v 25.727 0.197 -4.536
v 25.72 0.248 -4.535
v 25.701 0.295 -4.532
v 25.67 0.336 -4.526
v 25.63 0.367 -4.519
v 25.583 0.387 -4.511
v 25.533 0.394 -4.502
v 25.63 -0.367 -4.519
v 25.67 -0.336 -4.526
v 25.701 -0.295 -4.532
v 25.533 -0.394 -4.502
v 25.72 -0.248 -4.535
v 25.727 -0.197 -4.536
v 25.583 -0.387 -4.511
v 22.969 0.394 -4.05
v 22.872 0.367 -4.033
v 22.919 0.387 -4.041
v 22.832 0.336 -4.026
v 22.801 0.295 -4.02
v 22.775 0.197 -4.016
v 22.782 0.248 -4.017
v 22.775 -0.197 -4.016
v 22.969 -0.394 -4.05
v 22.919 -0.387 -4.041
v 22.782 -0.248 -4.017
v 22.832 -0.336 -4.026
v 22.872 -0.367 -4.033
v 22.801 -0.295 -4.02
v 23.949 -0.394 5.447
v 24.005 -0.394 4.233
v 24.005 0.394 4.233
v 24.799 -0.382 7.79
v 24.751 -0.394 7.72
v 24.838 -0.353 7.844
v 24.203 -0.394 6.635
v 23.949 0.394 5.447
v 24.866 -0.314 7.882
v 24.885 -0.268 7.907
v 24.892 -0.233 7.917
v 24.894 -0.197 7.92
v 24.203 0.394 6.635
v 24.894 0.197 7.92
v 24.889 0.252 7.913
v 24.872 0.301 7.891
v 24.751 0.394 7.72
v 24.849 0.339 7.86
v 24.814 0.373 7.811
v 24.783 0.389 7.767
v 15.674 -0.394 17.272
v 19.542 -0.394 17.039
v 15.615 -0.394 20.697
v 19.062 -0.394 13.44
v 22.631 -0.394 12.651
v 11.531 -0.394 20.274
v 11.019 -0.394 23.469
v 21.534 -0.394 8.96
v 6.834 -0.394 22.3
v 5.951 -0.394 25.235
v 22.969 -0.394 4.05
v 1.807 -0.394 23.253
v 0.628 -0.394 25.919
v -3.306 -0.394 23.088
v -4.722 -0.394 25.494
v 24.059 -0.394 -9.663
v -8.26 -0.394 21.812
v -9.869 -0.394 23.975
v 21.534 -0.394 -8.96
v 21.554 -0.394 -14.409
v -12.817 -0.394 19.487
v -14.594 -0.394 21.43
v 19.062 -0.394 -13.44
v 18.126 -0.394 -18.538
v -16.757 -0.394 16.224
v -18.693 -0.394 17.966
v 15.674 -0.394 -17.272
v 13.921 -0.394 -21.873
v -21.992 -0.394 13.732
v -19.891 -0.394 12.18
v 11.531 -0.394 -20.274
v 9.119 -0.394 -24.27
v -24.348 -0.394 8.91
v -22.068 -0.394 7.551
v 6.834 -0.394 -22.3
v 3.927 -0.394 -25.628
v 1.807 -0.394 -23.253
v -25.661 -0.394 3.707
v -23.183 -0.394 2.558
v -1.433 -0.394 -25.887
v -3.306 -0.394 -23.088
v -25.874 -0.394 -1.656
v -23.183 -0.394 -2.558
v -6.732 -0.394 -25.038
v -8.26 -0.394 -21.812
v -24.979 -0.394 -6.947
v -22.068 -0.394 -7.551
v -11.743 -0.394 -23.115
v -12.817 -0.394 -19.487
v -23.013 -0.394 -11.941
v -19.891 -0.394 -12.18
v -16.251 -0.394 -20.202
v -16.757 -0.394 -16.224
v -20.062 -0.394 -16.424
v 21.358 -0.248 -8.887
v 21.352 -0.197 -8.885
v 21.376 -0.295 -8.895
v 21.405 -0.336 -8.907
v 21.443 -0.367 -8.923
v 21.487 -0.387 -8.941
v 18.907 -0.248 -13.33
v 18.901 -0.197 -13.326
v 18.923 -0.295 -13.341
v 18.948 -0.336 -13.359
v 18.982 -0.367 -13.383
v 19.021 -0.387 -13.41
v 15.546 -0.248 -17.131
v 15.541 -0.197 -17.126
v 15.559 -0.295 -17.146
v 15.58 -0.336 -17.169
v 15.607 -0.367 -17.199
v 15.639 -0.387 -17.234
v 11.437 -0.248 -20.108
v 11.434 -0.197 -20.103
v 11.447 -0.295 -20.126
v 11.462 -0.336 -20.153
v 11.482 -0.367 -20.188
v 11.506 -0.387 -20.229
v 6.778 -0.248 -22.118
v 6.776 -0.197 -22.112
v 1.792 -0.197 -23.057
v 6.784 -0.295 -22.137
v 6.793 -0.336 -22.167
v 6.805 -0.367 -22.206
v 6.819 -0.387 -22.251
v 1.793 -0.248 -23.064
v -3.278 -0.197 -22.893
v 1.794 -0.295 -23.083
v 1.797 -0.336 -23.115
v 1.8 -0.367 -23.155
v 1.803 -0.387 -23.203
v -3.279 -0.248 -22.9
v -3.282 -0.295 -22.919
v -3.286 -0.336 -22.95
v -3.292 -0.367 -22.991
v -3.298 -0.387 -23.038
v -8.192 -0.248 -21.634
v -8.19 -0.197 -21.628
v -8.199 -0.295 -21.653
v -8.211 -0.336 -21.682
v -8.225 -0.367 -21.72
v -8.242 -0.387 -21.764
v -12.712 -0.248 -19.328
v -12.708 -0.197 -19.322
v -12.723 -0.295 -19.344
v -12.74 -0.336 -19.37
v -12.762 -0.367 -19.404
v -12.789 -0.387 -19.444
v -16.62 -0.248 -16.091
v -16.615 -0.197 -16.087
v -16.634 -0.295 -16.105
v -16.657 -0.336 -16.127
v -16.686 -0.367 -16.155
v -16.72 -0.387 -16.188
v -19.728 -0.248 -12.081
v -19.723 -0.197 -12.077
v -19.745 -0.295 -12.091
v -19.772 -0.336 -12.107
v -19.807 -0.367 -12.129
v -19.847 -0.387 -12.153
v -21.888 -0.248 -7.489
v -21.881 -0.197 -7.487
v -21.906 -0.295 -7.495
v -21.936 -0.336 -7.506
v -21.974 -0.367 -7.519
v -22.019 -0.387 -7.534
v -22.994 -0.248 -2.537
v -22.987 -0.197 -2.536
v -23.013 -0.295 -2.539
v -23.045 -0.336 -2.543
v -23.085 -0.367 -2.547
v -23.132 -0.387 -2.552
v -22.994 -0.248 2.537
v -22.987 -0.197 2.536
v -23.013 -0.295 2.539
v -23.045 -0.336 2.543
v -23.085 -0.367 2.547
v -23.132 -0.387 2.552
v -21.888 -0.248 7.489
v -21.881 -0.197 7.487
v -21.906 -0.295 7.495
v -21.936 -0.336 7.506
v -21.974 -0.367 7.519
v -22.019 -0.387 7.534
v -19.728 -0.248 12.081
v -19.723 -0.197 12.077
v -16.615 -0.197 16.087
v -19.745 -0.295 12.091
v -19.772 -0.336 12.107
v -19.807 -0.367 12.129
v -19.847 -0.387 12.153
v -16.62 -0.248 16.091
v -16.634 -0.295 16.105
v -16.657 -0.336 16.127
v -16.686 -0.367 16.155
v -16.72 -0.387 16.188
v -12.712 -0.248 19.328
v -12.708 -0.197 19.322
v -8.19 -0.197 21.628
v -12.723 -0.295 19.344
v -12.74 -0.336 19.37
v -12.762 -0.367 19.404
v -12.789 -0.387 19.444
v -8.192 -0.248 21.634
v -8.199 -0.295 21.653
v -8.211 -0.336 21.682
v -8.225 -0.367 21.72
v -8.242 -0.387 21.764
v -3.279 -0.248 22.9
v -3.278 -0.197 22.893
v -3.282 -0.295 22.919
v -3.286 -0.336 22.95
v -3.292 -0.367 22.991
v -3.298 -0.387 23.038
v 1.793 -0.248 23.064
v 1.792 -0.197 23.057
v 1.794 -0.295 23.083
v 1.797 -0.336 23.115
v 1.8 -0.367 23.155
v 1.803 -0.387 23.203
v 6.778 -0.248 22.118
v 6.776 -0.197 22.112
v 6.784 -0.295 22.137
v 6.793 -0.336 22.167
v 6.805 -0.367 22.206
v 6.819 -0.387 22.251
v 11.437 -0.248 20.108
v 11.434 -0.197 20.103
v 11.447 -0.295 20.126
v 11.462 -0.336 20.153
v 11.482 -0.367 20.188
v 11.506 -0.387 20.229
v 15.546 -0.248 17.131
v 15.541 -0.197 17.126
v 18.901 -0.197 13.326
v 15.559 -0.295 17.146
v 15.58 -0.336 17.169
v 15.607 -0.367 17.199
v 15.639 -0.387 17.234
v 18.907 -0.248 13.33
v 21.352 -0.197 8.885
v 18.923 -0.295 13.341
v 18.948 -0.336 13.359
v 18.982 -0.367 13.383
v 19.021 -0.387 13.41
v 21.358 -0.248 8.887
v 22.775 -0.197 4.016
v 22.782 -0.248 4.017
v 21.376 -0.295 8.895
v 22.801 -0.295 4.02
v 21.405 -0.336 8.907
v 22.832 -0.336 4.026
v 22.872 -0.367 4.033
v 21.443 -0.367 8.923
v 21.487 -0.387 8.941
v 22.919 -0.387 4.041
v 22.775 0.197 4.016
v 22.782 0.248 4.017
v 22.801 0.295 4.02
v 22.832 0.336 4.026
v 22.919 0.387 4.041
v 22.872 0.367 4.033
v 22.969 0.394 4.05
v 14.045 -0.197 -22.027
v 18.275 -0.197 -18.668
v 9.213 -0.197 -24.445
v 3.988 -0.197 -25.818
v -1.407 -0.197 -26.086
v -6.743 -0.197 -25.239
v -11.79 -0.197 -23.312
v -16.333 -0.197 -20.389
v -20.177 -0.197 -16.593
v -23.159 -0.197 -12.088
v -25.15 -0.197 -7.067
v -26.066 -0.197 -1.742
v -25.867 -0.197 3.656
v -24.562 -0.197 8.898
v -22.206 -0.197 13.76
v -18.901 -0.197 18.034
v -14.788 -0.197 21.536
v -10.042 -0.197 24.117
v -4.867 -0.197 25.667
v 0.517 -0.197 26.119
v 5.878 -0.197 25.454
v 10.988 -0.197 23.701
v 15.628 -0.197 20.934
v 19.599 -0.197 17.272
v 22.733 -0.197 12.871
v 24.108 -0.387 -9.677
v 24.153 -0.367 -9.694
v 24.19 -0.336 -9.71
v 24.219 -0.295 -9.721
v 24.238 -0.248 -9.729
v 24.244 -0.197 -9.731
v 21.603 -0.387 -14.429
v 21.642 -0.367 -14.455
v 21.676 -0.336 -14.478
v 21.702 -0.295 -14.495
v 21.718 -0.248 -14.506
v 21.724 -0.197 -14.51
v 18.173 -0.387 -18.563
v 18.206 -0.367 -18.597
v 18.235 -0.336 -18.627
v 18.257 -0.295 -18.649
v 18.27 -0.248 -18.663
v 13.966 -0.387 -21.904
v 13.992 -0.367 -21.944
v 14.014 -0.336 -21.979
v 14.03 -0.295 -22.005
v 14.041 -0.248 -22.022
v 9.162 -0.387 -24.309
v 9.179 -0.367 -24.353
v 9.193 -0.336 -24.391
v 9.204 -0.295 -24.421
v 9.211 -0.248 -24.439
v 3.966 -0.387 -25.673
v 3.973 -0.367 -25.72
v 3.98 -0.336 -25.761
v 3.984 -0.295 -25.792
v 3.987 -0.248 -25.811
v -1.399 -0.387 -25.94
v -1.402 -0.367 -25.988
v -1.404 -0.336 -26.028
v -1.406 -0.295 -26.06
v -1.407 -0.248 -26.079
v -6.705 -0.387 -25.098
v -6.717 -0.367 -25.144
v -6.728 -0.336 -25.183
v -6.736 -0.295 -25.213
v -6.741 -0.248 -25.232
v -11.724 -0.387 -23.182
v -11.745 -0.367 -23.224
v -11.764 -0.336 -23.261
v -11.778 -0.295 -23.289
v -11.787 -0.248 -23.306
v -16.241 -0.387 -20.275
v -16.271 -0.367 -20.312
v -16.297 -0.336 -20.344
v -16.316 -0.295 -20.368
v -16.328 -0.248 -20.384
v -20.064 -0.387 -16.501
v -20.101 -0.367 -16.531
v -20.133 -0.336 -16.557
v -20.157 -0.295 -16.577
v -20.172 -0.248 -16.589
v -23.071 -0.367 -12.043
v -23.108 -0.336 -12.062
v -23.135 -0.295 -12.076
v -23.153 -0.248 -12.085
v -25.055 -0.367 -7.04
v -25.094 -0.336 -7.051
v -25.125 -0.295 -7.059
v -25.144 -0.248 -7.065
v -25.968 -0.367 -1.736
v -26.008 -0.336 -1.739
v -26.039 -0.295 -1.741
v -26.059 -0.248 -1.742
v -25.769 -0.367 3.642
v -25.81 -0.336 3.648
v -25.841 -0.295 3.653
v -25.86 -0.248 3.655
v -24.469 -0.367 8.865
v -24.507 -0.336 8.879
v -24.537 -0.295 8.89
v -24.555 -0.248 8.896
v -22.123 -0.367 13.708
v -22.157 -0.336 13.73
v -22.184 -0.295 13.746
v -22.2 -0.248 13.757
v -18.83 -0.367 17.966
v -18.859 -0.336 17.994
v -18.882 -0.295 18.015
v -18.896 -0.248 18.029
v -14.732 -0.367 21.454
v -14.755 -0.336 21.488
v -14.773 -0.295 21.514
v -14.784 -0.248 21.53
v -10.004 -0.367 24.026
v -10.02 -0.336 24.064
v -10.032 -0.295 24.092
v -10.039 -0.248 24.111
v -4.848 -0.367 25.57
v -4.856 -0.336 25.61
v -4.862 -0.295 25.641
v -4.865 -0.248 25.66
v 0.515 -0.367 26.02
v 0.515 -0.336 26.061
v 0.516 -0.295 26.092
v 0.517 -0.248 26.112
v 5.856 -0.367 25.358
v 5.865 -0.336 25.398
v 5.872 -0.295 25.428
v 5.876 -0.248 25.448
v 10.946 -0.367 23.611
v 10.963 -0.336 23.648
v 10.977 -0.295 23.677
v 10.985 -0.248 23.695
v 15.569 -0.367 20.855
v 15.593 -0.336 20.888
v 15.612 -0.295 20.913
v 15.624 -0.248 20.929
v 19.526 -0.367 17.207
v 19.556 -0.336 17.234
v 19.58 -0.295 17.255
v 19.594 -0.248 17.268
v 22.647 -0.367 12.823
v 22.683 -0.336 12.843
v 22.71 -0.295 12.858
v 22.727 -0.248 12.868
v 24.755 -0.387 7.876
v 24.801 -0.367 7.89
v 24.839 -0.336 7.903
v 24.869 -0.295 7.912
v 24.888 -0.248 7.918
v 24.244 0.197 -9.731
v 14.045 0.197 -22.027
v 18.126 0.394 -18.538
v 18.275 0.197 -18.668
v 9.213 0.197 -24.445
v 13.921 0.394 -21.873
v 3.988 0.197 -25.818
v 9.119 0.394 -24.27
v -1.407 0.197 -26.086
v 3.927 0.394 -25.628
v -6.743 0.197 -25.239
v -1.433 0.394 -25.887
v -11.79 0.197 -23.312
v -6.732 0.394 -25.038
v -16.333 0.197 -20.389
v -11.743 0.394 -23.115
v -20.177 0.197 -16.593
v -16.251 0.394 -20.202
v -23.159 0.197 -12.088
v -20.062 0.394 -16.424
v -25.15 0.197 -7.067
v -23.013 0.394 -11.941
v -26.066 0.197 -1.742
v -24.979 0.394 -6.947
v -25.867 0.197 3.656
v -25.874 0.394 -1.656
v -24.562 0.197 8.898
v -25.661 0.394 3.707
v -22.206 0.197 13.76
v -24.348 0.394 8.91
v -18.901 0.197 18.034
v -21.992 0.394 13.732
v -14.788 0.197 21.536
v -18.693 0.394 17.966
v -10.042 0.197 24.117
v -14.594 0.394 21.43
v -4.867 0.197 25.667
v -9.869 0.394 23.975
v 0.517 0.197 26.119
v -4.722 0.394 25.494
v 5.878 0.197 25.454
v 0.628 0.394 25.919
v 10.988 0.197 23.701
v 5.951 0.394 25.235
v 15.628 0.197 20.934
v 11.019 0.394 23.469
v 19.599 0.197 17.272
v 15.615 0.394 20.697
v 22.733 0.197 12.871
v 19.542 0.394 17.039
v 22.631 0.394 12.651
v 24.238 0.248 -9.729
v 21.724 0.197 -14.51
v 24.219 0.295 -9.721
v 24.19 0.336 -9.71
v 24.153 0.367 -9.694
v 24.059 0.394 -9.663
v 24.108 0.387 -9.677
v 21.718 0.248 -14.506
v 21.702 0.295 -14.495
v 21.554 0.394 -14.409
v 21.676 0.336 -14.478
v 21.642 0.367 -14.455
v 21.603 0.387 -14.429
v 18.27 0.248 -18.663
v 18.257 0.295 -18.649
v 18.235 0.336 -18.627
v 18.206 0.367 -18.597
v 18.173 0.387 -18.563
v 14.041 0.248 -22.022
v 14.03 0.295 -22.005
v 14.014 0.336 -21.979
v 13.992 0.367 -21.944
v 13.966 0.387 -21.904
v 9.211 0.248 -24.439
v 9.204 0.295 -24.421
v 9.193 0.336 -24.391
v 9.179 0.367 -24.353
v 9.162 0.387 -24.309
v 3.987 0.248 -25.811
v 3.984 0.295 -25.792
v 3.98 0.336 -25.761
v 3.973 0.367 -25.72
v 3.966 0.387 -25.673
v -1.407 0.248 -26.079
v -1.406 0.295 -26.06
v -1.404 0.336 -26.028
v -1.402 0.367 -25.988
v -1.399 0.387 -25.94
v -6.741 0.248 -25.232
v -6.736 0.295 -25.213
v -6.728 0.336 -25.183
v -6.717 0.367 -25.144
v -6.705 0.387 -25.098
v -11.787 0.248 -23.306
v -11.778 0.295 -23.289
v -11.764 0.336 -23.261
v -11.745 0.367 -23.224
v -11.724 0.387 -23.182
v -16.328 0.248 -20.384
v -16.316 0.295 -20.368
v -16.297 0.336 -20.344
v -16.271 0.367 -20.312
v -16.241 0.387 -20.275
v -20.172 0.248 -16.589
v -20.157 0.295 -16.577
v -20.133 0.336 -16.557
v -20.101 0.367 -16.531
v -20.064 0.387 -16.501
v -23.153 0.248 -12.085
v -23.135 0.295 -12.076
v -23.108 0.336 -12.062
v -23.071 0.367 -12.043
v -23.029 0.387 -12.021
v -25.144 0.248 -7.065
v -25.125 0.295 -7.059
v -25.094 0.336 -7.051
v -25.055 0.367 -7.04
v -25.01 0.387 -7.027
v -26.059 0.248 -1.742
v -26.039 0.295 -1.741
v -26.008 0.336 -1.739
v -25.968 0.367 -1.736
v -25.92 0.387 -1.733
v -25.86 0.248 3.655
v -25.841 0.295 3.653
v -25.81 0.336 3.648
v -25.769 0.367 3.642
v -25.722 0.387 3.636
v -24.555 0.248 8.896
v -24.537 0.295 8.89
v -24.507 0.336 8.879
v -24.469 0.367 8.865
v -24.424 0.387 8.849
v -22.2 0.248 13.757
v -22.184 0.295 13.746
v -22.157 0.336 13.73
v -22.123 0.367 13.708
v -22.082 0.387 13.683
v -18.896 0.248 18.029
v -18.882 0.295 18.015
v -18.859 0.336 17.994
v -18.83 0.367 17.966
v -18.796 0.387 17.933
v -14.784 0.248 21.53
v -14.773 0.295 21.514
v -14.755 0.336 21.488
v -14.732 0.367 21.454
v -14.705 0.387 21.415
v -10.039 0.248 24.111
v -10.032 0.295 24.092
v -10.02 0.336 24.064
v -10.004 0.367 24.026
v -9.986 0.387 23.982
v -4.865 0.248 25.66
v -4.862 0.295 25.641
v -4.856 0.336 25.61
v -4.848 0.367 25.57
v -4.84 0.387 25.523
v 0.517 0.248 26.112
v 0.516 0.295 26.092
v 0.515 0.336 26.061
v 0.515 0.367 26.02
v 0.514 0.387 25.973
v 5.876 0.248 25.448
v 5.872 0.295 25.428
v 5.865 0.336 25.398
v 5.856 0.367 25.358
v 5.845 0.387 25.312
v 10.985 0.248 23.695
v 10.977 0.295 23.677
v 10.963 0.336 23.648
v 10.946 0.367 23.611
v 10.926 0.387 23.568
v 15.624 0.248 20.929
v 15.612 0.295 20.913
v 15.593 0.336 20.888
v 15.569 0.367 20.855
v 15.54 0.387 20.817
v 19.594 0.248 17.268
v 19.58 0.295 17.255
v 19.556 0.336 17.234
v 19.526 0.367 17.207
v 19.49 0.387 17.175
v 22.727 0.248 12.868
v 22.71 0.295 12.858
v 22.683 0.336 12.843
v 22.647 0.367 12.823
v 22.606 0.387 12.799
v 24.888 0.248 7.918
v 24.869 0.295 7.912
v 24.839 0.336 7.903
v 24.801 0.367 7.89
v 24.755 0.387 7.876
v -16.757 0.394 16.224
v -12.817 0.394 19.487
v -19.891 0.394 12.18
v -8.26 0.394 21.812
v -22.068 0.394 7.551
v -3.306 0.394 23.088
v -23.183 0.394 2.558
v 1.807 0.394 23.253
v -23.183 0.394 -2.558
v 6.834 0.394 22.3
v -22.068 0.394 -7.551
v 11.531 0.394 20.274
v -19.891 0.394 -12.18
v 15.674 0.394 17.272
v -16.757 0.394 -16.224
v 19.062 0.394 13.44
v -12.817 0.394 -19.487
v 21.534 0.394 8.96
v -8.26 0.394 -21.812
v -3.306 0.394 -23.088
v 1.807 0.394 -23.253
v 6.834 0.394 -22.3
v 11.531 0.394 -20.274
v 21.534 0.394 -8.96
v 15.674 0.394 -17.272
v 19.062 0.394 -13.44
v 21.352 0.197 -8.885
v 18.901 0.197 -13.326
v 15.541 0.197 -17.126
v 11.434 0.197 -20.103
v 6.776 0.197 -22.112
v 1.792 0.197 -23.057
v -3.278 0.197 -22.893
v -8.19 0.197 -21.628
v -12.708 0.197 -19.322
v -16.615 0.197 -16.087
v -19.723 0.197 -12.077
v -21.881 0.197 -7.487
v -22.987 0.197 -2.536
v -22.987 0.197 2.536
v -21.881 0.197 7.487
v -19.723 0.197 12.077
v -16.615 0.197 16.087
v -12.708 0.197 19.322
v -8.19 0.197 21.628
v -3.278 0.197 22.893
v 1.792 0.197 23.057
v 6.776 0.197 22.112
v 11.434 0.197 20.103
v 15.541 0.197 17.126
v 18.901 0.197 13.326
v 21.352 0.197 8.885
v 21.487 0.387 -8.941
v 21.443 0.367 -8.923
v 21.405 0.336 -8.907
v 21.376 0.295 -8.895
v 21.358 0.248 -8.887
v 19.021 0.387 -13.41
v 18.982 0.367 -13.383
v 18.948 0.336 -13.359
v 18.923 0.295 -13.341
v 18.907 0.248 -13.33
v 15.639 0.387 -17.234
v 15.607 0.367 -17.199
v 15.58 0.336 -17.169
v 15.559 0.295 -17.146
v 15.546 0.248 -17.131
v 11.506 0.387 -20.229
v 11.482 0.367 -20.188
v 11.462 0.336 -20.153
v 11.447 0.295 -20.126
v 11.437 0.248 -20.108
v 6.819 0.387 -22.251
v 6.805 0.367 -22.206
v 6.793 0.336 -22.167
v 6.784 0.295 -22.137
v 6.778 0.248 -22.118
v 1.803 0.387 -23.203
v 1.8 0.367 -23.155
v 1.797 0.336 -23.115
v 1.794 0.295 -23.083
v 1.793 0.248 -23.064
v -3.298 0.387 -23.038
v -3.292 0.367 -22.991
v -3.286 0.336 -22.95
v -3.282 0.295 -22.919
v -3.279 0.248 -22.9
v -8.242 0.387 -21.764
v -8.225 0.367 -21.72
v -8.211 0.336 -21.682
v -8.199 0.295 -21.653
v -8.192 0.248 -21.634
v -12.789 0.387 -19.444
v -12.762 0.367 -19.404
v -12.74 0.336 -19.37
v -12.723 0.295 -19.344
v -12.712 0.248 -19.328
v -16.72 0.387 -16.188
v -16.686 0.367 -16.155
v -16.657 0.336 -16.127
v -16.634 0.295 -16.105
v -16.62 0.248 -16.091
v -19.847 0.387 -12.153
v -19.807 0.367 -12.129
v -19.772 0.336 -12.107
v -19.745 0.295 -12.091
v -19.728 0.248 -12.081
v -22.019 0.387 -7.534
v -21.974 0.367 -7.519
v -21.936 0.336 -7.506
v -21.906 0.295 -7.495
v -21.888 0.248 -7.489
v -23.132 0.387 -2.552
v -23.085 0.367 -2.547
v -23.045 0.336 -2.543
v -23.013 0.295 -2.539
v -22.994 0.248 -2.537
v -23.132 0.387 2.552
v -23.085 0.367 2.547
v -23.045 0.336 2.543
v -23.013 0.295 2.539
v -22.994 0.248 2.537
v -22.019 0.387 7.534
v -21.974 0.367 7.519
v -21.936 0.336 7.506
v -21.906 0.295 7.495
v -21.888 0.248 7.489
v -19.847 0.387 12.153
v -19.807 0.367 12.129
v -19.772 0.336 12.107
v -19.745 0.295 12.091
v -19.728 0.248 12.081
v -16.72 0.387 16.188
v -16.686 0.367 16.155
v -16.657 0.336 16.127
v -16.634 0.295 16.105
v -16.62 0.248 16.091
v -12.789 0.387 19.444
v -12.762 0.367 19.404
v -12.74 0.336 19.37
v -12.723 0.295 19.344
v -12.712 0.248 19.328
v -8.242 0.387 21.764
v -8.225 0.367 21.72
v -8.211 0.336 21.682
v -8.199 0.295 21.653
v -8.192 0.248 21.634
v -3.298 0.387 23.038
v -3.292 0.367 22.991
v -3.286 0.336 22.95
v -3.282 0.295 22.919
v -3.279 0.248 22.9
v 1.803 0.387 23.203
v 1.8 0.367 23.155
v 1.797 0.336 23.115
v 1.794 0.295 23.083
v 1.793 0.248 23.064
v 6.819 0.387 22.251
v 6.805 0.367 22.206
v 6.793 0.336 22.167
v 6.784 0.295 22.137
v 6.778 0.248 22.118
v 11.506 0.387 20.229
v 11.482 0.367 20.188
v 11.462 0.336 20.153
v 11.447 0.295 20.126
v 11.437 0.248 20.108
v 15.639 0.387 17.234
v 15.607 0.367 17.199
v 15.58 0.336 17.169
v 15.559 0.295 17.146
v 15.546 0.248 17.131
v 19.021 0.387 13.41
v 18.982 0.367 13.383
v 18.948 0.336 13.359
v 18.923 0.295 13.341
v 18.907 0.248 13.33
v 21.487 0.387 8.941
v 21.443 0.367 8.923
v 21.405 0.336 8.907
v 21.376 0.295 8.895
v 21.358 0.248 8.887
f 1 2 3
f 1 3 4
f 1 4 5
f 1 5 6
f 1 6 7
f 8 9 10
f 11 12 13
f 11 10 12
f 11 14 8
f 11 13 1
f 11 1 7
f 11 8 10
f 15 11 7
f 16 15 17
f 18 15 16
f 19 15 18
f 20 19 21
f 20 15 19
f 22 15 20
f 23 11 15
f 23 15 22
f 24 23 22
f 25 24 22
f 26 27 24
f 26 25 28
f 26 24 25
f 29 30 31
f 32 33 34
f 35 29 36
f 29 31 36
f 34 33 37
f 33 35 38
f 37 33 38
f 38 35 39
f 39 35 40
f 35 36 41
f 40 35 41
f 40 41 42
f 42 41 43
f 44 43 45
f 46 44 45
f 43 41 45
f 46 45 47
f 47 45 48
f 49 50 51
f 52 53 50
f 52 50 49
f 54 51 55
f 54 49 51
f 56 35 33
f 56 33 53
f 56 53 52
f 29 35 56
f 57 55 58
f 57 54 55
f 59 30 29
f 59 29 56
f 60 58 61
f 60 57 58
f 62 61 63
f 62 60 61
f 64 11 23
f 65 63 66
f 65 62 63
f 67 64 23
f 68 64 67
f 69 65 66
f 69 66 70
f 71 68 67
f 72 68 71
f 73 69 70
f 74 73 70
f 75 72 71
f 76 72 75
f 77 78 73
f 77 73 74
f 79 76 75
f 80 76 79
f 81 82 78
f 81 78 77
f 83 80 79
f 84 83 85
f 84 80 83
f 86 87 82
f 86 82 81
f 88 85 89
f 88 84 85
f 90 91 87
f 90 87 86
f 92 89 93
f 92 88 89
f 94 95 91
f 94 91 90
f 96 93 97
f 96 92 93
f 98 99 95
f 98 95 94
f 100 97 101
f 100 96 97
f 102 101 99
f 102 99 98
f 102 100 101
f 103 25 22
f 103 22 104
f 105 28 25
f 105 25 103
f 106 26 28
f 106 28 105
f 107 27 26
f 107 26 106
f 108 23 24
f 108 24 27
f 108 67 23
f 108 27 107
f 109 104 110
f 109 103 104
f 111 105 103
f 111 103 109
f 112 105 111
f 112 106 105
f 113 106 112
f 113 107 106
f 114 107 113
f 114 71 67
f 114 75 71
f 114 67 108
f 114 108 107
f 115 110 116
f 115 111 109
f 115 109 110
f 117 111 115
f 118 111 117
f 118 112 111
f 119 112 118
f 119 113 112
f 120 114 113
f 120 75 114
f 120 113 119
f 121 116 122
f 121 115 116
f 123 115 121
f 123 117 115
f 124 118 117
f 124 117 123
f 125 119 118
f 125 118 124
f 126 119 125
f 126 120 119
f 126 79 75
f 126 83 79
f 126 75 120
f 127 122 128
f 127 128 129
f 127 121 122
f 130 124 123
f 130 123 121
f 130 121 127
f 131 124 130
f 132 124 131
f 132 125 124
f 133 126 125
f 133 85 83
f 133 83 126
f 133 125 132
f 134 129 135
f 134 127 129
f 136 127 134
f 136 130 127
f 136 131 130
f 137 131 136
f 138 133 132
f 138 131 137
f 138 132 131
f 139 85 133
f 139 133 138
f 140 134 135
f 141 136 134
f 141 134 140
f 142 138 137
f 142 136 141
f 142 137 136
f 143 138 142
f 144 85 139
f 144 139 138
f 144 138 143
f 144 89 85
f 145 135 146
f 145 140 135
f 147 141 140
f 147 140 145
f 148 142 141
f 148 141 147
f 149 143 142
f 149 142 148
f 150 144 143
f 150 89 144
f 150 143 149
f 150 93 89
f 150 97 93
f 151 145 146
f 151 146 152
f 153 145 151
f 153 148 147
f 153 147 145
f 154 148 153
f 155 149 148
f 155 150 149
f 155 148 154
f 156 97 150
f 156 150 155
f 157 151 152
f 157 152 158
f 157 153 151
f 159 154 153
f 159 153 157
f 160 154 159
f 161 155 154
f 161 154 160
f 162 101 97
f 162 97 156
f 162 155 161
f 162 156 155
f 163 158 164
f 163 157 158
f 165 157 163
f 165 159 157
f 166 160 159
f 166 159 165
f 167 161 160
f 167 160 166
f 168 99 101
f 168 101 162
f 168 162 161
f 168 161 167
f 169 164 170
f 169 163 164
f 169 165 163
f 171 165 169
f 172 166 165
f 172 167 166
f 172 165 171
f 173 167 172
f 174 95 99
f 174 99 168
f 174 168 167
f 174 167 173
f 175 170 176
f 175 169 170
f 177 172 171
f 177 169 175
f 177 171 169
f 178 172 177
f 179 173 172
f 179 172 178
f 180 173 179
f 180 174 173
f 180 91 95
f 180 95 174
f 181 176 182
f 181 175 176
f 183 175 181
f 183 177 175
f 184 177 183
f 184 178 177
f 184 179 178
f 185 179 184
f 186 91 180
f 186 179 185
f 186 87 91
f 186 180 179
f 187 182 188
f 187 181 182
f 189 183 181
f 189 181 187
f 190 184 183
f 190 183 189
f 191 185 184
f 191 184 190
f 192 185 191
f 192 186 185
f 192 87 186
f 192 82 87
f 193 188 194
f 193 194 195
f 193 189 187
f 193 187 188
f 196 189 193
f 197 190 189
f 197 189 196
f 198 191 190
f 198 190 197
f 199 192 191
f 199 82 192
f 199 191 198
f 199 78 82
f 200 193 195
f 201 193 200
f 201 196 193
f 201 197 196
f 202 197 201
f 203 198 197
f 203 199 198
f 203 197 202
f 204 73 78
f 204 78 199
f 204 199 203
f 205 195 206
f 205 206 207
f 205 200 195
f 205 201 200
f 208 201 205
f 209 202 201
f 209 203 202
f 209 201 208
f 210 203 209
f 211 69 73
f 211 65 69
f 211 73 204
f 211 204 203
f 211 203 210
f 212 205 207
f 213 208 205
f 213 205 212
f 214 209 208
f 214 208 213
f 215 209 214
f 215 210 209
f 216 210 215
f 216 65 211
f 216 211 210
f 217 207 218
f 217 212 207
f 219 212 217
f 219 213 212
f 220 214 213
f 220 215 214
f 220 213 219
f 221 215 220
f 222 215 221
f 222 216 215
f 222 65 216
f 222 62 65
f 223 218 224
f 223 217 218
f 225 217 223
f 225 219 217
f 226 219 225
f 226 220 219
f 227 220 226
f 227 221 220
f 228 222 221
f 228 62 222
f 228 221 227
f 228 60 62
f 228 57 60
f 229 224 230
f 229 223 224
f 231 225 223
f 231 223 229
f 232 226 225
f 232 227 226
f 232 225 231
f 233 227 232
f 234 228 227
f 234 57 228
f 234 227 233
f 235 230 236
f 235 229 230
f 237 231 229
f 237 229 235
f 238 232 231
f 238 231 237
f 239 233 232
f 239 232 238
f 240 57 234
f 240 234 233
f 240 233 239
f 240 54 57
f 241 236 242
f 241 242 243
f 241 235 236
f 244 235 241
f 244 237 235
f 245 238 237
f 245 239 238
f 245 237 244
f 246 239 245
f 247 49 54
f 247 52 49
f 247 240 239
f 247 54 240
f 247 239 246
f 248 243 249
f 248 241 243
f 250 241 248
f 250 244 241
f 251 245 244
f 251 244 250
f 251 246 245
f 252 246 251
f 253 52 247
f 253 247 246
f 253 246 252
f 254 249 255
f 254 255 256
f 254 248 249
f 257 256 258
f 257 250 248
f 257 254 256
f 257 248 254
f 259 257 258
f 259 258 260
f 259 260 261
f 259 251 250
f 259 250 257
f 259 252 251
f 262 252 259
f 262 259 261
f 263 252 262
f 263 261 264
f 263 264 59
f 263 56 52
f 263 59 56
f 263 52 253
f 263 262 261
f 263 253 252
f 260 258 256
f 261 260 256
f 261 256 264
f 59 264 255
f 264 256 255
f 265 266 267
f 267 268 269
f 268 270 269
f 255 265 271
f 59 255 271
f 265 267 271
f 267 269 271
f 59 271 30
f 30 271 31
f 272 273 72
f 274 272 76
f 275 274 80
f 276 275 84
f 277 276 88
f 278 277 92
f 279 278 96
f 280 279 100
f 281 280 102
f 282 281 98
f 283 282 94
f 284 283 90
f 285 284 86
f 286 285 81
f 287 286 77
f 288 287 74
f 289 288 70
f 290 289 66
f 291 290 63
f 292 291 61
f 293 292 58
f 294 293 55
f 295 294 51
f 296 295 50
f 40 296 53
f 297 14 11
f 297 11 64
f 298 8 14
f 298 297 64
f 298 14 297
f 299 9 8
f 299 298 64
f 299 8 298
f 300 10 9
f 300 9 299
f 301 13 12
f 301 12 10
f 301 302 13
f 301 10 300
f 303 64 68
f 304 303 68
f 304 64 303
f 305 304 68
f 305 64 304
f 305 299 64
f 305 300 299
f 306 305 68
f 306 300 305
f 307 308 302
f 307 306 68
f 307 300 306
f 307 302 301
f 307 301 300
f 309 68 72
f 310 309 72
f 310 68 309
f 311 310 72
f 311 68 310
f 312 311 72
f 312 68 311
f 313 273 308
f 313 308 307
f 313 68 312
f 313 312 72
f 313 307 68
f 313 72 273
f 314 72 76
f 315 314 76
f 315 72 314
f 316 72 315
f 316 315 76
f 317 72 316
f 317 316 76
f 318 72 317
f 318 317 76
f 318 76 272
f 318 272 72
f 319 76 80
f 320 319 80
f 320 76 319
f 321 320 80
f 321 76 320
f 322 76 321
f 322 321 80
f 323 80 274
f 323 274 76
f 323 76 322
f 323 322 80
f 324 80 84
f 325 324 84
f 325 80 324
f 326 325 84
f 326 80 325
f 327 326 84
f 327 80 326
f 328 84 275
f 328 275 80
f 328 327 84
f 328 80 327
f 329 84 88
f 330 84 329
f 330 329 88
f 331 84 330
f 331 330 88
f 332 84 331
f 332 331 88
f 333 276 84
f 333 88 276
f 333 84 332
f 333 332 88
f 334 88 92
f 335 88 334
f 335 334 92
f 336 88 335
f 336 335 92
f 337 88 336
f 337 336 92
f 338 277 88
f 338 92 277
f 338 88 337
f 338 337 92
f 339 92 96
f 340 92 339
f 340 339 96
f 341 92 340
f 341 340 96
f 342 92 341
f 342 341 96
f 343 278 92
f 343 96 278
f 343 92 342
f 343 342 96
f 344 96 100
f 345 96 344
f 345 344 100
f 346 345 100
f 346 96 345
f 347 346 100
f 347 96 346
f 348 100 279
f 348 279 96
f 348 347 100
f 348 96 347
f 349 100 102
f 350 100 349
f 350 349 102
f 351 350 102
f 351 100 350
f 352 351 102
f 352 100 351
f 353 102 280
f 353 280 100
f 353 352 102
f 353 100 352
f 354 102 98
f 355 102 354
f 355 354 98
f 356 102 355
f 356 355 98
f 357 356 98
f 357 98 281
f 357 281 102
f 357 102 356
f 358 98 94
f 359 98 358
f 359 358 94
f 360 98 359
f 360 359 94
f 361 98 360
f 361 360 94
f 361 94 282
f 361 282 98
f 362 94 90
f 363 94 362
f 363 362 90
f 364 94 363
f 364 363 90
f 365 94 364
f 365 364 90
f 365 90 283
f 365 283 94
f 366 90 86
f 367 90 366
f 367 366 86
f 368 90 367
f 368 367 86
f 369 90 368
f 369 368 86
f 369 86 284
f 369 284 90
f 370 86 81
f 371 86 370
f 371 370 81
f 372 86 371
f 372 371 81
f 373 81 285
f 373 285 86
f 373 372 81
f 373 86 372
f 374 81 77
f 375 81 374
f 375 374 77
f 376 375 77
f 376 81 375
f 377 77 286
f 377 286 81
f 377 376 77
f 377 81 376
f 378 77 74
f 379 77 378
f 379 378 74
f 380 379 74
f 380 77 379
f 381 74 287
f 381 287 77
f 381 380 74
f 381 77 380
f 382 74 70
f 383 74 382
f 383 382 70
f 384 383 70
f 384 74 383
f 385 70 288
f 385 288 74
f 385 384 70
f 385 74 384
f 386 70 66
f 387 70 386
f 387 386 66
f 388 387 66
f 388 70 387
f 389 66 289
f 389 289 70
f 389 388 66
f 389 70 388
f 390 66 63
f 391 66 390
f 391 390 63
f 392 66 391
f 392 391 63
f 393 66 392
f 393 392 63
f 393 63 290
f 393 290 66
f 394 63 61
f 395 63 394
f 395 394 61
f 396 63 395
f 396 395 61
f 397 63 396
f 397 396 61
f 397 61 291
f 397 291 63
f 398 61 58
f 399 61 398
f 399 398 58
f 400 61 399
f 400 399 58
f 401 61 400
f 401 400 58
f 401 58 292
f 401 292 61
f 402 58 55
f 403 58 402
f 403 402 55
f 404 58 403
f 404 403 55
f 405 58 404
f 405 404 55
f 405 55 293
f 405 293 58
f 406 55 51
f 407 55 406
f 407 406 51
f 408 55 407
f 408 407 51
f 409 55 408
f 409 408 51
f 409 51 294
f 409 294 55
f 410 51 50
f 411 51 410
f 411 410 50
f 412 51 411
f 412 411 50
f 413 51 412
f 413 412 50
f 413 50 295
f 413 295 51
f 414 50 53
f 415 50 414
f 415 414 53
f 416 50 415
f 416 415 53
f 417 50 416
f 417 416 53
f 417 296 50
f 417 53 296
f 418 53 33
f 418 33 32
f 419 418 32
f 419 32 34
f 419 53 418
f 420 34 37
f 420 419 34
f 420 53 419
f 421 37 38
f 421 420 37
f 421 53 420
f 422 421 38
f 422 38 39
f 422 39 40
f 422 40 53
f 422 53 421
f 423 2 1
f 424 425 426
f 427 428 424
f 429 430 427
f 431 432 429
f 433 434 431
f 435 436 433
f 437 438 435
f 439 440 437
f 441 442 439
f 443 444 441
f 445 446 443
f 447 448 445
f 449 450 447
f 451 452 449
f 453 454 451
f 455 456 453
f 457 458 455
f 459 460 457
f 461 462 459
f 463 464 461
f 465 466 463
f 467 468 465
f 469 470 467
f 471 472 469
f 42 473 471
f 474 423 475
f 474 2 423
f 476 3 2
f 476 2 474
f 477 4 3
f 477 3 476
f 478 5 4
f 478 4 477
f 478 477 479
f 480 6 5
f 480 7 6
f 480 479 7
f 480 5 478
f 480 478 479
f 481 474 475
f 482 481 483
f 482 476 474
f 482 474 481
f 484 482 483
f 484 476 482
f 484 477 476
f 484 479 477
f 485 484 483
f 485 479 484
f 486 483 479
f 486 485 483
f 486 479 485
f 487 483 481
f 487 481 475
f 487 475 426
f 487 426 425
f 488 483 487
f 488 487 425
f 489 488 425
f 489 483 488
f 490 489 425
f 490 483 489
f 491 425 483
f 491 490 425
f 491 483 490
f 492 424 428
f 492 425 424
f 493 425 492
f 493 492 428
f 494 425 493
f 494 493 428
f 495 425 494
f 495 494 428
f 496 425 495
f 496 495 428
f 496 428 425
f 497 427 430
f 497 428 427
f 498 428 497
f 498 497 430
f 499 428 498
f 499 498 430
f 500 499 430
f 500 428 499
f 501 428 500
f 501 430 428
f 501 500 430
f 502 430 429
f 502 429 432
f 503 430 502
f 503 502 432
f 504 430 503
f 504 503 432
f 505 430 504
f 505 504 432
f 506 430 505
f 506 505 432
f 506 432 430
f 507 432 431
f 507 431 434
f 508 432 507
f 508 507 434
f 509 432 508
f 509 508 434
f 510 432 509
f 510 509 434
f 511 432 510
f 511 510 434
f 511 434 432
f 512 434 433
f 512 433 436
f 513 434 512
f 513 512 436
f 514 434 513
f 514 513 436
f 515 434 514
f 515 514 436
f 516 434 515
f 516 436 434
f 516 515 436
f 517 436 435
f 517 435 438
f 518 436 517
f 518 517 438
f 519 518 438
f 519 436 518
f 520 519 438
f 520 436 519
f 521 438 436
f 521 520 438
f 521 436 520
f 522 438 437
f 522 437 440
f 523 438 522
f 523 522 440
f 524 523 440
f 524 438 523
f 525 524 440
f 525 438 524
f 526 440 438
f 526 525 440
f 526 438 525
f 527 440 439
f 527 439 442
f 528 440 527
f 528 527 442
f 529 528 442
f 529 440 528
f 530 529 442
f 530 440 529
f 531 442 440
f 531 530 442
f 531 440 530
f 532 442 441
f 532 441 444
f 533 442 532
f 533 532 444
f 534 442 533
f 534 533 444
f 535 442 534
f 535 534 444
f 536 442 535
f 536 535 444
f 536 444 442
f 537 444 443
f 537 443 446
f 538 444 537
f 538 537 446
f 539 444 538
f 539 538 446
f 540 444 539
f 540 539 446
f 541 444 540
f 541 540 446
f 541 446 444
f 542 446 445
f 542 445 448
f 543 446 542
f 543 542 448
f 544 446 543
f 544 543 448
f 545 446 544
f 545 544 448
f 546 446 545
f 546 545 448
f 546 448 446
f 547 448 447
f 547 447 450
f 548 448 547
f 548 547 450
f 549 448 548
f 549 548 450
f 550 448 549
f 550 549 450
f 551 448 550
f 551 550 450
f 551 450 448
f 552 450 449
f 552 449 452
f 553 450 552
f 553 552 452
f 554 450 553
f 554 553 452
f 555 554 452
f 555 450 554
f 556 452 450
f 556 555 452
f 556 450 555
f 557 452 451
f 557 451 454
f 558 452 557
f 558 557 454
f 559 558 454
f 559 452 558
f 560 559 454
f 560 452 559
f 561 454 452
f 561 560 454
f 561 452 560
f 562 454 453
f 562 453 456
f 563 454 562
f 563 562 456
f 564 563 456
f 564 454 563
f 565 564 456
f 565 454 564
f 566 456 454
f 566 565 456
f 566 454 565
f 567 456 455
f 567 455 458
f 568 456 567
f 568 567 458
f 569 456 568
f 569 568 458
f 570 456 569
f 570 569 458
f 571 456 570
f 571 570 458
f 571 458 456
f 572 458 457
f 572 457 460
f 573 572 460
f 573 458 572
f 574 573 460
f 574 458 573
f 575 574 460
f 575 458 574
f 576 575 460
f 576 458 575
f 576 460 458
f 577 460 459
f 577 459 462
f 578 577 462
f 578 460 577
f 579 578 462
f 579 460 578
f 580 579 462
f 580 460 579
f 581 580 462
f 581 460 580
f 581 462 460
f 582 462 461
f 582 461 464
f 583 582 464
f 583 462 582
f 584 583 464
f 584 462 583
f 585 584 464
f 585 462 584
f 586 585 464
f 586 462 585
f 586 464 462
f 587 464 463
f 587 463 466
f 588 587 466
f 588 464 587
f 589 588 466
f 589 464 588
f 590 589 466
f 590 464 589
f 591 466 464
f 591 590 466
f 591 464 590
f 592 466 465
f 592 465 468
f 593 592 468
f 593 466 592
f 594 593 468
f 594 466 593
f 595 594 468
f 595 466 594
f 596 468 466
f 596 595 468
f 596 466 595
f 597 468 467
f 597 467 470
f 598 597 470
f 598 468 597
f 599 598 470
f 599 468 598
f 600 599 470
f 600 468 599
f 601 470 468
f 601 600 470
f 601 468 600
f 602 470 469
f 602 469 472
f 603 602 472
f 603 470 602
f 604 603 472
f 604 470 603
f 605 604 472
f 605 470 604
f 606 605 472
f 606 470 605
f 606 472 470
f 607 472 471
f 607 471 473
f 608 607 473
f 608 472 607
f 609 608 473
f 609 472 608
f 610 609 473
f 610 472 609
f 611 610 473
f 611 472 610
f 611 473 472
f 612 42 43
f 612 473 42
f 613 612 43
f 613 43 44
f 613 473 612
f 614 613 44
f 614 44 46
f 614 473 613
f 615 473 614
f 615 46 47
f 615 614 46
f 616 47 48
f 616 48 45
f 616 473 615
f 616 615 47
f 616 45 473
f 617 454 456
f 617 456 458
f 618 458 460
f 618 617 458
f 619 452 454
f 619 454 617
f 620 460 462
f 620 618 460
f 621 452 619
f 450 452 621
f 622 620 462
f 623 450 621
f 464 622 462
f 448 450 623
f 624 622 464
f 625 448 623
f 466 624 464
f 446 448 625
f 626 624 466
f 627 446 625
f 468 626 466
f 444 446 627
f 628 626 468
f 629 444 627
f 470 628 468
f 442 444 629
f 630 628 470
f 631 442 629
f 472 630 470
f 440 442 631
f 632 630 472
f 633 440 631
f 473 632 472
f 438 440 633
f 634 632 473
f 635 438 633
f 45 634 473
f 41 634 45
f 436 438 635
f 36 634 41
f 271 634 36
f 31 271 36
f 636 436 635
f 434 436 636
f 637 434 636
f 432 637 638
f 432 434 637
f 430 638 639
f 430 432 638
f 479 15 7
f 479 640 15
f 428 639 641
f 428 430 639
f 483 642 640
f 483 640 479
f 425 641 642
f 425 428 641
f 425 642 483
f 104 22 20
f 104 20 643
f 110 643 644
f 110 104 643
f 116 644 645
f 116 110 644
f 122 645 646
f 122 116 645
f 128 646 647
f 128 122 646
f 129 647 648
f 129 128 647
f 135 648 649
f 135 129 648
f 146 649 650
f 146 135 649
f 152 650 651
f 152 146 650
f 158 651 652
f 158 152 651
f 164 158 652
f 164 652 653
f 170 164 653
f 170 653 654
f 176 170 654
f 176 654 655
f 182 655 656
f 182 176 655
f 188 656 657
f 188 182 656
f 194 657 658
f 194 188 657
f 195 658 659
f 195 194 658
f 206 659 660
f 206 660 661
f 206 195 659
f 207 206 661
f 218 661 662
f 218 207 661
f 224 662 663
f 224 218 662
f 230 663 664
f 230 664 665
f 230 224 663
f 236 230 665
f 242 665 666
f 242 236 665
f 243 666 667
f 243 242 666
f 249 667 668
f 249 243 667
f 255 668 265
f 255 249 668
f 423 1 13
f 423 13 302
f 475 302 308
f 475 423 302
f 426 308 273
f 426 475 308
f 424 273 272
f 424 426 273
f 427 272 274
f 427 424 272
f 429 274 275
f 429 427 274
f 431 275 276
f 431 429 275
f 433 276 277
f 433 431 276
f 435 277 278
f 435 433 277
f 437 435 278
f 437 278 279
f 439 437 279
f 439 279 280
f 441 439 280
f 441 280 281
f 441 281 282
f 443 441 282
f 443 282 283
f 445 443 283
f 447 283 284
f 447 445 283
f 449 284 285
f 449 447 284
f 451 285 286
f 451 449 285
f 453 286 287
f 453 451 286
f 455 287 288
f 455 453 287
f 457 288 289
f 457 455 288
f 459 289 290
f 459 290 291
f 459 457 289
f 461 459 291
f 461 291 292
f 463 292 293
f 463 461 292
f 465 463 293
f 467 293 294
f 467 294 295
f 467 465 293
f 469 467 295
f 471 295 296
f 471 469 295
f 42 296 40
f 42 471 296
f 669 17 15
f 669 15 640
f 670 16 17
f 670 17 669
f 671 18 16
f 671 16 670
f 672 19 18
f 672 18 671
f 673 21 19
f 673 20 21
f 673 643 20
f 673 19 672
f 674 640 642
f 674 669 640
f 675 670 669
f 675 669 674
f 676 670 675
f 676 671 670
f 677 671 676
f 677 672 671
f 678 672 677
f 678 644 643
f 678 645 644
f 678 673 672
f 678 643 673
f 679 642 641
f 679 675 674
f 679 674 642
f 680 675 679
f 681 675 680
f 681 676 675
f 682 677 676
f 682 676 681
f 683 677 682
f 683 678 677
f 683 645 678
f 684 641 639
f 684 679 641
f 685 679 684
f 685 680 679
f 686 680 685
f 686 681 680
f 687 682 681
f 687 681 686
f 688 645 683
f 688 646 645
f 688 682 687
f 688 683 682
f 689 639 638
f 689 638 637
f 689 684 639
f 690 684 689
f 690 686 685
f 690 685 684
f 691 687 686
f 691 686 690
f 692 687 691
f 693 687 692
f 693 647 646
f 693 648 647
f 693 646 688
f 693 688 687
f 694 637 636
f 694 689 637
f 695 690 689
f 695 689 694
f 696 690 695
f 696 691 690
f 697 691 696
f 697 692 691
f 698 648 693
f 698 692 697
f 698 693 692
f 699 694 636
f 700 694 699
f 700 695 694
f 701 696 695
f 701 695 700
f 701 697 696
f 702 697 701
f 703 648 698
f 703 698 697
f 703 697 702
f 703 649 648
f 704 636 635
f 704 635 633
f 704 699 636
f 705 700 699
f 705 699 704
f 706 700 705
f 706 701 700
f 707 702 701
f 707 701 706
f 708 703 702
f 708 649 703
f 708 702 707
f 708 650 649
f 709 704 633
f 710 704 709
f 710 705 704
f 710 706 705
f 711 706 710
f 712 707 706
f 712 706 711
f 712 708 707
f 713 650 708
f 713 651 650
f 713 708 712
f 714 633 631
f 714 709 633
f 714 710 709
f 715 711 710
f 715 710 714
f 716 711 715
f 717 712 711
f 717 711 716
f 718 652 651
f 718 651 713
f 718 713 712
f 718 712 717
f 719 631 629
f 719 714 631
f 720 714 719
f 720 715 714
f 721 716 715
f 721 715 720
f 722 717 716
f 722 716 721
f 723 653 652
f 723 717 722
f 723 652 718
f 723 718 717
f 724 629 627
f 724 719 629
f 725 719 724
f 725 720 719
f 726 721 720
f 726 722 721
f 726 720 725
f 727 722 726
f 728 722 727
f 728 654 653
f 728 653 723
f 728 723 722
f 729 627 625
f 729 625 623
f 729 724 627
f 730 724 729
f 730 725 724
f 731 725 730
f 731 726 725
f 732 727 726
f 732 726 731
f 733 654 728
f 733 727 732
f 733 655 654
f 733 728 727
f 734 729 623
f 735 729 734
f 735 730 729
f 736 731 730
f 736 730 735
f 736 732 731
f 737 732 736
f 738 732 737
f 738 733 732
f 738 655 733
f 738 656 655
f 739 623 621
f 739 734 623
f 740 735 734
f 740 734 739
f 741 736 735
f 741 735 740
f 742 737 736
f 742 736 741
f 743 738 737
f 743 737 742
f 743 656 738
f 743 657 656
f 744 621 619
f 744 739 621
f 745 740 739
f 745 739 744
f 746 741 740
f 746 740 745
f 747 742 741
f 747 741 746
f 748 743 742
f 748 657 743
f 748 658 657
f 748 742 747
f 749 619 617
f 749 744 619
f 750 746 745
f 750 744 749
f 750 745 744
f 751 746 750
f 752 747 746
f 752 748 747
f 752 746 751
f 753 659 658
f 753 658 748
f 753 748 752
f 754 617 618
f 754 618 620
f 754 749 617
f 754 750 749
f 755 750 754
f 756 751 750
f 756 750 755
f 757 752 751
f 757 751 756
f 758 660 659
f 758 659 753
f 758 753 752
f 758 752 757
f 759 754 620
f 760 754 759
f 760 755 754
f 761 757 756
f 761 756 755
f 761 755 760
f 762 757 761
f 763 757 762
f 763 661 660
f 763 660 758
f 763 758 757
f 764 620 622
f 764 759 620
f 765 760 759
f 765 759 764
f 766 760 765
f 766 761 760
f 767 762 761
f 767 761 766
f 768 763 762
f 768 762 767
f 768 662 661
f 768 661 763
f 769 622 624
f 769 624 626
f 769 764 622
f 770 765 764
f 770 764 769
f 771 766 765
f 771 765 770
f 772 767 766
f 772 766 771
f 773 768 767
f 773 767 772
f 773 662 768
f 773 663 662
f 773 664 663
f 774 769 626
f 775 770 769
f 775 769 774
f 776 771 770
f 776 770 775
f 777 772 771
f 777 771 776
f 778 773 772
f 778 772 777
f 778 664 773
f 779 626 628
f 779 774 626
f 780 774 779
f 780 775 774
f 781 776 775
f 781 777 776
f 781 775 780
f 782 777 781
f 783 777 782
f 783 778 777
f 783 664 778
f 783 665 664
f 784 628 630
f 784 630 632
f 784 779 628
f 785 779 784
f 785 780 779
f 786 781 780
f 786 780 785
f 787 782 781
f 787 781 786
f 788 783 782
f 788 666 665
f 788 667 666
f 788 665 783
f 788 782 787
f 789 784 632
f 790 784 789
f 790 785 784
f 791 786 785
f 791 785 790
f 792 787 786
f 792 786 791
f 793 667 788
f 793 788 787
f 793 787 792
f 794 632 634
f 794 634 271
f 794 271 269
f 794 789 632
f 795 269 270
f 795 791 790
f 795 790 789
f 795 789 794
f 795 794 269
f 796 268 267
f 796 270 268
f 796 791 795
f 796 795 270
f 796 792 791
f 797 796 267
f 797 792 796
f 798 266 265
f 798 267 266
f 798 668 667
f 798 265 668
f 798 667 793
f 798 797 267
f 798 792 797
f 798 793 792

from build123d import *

# Parameters (mm, degrees)
CUT_EXTRUDE1_DEPTH      = 0.7874
CUT_EXTRUDE1_DEPTH_BACK = 0.7874


with BuildPart() as part:
    # Sketch1 → Revolve1 (revolve)
    with BuildSketch(Plane.XY):
        with BuildLine():
            Line((23.1267, 0.19685), (23.1267, -0.19685))
            ThreePointArc((23.1267, -0.19685), (23.18435603, -0.33604397), (23.32355, -0.3937))
            Line((23.32355, -0.3937), (25.92705, -0.3937))
            ThreePointArc((25.92705, -0.3937), (26.06624397, -0.33604397), (26.1239, -0.19685))
            Line((26.1239, -0.19685), (26.1239, 0.19685))
            ThreePointArc((26.1239, 0.19685), (26.06624397, 0.33604397), (25.92705, 0.3937))
            Line((25.92705, 0.3937), (23.32355, 0.3937))
            ThreePointArc((23.32355, 0.3937), (23.18435603, 0.33604397), (23.1267, 0.19685))
        make_face()
    revolve(axis=Axis((0, -1270, 0), (0, 1, 0)))

    # Sketch2 → Cut-Extrude1 (cut, two sides: drawn at the far end of the back side and taken through both)
    with BuildSketch(Plane(origin=(0, 0, 0), x_dir=(1, 0, 0), z_dir=(0, 1, 0)).offset(-CUT_EXTRUDE1_DEPTH_BACK)):
        with BuildLine():
            Line((0, 0), (24.00521421, -4.232766943))
            ThreePointArc((24.00521421, -4.232766943), (24.582954237, -7.45378069), (27.108261822, -9.535014627))
            ThreePointArc((27.108261822, -9.535014627), (28.640097584, -2.349292098), (28.299721185, 4.990004391))
            Line((28.299721185, 4.990004391), (0, 0))
        make_face()
    extrude(amount=CUT_EXTRUDE1_DEPTH + CUT_EXTRUDE1_DEPTH_BACK, mode=Mode.SUBTRACT)


solid = part.part
